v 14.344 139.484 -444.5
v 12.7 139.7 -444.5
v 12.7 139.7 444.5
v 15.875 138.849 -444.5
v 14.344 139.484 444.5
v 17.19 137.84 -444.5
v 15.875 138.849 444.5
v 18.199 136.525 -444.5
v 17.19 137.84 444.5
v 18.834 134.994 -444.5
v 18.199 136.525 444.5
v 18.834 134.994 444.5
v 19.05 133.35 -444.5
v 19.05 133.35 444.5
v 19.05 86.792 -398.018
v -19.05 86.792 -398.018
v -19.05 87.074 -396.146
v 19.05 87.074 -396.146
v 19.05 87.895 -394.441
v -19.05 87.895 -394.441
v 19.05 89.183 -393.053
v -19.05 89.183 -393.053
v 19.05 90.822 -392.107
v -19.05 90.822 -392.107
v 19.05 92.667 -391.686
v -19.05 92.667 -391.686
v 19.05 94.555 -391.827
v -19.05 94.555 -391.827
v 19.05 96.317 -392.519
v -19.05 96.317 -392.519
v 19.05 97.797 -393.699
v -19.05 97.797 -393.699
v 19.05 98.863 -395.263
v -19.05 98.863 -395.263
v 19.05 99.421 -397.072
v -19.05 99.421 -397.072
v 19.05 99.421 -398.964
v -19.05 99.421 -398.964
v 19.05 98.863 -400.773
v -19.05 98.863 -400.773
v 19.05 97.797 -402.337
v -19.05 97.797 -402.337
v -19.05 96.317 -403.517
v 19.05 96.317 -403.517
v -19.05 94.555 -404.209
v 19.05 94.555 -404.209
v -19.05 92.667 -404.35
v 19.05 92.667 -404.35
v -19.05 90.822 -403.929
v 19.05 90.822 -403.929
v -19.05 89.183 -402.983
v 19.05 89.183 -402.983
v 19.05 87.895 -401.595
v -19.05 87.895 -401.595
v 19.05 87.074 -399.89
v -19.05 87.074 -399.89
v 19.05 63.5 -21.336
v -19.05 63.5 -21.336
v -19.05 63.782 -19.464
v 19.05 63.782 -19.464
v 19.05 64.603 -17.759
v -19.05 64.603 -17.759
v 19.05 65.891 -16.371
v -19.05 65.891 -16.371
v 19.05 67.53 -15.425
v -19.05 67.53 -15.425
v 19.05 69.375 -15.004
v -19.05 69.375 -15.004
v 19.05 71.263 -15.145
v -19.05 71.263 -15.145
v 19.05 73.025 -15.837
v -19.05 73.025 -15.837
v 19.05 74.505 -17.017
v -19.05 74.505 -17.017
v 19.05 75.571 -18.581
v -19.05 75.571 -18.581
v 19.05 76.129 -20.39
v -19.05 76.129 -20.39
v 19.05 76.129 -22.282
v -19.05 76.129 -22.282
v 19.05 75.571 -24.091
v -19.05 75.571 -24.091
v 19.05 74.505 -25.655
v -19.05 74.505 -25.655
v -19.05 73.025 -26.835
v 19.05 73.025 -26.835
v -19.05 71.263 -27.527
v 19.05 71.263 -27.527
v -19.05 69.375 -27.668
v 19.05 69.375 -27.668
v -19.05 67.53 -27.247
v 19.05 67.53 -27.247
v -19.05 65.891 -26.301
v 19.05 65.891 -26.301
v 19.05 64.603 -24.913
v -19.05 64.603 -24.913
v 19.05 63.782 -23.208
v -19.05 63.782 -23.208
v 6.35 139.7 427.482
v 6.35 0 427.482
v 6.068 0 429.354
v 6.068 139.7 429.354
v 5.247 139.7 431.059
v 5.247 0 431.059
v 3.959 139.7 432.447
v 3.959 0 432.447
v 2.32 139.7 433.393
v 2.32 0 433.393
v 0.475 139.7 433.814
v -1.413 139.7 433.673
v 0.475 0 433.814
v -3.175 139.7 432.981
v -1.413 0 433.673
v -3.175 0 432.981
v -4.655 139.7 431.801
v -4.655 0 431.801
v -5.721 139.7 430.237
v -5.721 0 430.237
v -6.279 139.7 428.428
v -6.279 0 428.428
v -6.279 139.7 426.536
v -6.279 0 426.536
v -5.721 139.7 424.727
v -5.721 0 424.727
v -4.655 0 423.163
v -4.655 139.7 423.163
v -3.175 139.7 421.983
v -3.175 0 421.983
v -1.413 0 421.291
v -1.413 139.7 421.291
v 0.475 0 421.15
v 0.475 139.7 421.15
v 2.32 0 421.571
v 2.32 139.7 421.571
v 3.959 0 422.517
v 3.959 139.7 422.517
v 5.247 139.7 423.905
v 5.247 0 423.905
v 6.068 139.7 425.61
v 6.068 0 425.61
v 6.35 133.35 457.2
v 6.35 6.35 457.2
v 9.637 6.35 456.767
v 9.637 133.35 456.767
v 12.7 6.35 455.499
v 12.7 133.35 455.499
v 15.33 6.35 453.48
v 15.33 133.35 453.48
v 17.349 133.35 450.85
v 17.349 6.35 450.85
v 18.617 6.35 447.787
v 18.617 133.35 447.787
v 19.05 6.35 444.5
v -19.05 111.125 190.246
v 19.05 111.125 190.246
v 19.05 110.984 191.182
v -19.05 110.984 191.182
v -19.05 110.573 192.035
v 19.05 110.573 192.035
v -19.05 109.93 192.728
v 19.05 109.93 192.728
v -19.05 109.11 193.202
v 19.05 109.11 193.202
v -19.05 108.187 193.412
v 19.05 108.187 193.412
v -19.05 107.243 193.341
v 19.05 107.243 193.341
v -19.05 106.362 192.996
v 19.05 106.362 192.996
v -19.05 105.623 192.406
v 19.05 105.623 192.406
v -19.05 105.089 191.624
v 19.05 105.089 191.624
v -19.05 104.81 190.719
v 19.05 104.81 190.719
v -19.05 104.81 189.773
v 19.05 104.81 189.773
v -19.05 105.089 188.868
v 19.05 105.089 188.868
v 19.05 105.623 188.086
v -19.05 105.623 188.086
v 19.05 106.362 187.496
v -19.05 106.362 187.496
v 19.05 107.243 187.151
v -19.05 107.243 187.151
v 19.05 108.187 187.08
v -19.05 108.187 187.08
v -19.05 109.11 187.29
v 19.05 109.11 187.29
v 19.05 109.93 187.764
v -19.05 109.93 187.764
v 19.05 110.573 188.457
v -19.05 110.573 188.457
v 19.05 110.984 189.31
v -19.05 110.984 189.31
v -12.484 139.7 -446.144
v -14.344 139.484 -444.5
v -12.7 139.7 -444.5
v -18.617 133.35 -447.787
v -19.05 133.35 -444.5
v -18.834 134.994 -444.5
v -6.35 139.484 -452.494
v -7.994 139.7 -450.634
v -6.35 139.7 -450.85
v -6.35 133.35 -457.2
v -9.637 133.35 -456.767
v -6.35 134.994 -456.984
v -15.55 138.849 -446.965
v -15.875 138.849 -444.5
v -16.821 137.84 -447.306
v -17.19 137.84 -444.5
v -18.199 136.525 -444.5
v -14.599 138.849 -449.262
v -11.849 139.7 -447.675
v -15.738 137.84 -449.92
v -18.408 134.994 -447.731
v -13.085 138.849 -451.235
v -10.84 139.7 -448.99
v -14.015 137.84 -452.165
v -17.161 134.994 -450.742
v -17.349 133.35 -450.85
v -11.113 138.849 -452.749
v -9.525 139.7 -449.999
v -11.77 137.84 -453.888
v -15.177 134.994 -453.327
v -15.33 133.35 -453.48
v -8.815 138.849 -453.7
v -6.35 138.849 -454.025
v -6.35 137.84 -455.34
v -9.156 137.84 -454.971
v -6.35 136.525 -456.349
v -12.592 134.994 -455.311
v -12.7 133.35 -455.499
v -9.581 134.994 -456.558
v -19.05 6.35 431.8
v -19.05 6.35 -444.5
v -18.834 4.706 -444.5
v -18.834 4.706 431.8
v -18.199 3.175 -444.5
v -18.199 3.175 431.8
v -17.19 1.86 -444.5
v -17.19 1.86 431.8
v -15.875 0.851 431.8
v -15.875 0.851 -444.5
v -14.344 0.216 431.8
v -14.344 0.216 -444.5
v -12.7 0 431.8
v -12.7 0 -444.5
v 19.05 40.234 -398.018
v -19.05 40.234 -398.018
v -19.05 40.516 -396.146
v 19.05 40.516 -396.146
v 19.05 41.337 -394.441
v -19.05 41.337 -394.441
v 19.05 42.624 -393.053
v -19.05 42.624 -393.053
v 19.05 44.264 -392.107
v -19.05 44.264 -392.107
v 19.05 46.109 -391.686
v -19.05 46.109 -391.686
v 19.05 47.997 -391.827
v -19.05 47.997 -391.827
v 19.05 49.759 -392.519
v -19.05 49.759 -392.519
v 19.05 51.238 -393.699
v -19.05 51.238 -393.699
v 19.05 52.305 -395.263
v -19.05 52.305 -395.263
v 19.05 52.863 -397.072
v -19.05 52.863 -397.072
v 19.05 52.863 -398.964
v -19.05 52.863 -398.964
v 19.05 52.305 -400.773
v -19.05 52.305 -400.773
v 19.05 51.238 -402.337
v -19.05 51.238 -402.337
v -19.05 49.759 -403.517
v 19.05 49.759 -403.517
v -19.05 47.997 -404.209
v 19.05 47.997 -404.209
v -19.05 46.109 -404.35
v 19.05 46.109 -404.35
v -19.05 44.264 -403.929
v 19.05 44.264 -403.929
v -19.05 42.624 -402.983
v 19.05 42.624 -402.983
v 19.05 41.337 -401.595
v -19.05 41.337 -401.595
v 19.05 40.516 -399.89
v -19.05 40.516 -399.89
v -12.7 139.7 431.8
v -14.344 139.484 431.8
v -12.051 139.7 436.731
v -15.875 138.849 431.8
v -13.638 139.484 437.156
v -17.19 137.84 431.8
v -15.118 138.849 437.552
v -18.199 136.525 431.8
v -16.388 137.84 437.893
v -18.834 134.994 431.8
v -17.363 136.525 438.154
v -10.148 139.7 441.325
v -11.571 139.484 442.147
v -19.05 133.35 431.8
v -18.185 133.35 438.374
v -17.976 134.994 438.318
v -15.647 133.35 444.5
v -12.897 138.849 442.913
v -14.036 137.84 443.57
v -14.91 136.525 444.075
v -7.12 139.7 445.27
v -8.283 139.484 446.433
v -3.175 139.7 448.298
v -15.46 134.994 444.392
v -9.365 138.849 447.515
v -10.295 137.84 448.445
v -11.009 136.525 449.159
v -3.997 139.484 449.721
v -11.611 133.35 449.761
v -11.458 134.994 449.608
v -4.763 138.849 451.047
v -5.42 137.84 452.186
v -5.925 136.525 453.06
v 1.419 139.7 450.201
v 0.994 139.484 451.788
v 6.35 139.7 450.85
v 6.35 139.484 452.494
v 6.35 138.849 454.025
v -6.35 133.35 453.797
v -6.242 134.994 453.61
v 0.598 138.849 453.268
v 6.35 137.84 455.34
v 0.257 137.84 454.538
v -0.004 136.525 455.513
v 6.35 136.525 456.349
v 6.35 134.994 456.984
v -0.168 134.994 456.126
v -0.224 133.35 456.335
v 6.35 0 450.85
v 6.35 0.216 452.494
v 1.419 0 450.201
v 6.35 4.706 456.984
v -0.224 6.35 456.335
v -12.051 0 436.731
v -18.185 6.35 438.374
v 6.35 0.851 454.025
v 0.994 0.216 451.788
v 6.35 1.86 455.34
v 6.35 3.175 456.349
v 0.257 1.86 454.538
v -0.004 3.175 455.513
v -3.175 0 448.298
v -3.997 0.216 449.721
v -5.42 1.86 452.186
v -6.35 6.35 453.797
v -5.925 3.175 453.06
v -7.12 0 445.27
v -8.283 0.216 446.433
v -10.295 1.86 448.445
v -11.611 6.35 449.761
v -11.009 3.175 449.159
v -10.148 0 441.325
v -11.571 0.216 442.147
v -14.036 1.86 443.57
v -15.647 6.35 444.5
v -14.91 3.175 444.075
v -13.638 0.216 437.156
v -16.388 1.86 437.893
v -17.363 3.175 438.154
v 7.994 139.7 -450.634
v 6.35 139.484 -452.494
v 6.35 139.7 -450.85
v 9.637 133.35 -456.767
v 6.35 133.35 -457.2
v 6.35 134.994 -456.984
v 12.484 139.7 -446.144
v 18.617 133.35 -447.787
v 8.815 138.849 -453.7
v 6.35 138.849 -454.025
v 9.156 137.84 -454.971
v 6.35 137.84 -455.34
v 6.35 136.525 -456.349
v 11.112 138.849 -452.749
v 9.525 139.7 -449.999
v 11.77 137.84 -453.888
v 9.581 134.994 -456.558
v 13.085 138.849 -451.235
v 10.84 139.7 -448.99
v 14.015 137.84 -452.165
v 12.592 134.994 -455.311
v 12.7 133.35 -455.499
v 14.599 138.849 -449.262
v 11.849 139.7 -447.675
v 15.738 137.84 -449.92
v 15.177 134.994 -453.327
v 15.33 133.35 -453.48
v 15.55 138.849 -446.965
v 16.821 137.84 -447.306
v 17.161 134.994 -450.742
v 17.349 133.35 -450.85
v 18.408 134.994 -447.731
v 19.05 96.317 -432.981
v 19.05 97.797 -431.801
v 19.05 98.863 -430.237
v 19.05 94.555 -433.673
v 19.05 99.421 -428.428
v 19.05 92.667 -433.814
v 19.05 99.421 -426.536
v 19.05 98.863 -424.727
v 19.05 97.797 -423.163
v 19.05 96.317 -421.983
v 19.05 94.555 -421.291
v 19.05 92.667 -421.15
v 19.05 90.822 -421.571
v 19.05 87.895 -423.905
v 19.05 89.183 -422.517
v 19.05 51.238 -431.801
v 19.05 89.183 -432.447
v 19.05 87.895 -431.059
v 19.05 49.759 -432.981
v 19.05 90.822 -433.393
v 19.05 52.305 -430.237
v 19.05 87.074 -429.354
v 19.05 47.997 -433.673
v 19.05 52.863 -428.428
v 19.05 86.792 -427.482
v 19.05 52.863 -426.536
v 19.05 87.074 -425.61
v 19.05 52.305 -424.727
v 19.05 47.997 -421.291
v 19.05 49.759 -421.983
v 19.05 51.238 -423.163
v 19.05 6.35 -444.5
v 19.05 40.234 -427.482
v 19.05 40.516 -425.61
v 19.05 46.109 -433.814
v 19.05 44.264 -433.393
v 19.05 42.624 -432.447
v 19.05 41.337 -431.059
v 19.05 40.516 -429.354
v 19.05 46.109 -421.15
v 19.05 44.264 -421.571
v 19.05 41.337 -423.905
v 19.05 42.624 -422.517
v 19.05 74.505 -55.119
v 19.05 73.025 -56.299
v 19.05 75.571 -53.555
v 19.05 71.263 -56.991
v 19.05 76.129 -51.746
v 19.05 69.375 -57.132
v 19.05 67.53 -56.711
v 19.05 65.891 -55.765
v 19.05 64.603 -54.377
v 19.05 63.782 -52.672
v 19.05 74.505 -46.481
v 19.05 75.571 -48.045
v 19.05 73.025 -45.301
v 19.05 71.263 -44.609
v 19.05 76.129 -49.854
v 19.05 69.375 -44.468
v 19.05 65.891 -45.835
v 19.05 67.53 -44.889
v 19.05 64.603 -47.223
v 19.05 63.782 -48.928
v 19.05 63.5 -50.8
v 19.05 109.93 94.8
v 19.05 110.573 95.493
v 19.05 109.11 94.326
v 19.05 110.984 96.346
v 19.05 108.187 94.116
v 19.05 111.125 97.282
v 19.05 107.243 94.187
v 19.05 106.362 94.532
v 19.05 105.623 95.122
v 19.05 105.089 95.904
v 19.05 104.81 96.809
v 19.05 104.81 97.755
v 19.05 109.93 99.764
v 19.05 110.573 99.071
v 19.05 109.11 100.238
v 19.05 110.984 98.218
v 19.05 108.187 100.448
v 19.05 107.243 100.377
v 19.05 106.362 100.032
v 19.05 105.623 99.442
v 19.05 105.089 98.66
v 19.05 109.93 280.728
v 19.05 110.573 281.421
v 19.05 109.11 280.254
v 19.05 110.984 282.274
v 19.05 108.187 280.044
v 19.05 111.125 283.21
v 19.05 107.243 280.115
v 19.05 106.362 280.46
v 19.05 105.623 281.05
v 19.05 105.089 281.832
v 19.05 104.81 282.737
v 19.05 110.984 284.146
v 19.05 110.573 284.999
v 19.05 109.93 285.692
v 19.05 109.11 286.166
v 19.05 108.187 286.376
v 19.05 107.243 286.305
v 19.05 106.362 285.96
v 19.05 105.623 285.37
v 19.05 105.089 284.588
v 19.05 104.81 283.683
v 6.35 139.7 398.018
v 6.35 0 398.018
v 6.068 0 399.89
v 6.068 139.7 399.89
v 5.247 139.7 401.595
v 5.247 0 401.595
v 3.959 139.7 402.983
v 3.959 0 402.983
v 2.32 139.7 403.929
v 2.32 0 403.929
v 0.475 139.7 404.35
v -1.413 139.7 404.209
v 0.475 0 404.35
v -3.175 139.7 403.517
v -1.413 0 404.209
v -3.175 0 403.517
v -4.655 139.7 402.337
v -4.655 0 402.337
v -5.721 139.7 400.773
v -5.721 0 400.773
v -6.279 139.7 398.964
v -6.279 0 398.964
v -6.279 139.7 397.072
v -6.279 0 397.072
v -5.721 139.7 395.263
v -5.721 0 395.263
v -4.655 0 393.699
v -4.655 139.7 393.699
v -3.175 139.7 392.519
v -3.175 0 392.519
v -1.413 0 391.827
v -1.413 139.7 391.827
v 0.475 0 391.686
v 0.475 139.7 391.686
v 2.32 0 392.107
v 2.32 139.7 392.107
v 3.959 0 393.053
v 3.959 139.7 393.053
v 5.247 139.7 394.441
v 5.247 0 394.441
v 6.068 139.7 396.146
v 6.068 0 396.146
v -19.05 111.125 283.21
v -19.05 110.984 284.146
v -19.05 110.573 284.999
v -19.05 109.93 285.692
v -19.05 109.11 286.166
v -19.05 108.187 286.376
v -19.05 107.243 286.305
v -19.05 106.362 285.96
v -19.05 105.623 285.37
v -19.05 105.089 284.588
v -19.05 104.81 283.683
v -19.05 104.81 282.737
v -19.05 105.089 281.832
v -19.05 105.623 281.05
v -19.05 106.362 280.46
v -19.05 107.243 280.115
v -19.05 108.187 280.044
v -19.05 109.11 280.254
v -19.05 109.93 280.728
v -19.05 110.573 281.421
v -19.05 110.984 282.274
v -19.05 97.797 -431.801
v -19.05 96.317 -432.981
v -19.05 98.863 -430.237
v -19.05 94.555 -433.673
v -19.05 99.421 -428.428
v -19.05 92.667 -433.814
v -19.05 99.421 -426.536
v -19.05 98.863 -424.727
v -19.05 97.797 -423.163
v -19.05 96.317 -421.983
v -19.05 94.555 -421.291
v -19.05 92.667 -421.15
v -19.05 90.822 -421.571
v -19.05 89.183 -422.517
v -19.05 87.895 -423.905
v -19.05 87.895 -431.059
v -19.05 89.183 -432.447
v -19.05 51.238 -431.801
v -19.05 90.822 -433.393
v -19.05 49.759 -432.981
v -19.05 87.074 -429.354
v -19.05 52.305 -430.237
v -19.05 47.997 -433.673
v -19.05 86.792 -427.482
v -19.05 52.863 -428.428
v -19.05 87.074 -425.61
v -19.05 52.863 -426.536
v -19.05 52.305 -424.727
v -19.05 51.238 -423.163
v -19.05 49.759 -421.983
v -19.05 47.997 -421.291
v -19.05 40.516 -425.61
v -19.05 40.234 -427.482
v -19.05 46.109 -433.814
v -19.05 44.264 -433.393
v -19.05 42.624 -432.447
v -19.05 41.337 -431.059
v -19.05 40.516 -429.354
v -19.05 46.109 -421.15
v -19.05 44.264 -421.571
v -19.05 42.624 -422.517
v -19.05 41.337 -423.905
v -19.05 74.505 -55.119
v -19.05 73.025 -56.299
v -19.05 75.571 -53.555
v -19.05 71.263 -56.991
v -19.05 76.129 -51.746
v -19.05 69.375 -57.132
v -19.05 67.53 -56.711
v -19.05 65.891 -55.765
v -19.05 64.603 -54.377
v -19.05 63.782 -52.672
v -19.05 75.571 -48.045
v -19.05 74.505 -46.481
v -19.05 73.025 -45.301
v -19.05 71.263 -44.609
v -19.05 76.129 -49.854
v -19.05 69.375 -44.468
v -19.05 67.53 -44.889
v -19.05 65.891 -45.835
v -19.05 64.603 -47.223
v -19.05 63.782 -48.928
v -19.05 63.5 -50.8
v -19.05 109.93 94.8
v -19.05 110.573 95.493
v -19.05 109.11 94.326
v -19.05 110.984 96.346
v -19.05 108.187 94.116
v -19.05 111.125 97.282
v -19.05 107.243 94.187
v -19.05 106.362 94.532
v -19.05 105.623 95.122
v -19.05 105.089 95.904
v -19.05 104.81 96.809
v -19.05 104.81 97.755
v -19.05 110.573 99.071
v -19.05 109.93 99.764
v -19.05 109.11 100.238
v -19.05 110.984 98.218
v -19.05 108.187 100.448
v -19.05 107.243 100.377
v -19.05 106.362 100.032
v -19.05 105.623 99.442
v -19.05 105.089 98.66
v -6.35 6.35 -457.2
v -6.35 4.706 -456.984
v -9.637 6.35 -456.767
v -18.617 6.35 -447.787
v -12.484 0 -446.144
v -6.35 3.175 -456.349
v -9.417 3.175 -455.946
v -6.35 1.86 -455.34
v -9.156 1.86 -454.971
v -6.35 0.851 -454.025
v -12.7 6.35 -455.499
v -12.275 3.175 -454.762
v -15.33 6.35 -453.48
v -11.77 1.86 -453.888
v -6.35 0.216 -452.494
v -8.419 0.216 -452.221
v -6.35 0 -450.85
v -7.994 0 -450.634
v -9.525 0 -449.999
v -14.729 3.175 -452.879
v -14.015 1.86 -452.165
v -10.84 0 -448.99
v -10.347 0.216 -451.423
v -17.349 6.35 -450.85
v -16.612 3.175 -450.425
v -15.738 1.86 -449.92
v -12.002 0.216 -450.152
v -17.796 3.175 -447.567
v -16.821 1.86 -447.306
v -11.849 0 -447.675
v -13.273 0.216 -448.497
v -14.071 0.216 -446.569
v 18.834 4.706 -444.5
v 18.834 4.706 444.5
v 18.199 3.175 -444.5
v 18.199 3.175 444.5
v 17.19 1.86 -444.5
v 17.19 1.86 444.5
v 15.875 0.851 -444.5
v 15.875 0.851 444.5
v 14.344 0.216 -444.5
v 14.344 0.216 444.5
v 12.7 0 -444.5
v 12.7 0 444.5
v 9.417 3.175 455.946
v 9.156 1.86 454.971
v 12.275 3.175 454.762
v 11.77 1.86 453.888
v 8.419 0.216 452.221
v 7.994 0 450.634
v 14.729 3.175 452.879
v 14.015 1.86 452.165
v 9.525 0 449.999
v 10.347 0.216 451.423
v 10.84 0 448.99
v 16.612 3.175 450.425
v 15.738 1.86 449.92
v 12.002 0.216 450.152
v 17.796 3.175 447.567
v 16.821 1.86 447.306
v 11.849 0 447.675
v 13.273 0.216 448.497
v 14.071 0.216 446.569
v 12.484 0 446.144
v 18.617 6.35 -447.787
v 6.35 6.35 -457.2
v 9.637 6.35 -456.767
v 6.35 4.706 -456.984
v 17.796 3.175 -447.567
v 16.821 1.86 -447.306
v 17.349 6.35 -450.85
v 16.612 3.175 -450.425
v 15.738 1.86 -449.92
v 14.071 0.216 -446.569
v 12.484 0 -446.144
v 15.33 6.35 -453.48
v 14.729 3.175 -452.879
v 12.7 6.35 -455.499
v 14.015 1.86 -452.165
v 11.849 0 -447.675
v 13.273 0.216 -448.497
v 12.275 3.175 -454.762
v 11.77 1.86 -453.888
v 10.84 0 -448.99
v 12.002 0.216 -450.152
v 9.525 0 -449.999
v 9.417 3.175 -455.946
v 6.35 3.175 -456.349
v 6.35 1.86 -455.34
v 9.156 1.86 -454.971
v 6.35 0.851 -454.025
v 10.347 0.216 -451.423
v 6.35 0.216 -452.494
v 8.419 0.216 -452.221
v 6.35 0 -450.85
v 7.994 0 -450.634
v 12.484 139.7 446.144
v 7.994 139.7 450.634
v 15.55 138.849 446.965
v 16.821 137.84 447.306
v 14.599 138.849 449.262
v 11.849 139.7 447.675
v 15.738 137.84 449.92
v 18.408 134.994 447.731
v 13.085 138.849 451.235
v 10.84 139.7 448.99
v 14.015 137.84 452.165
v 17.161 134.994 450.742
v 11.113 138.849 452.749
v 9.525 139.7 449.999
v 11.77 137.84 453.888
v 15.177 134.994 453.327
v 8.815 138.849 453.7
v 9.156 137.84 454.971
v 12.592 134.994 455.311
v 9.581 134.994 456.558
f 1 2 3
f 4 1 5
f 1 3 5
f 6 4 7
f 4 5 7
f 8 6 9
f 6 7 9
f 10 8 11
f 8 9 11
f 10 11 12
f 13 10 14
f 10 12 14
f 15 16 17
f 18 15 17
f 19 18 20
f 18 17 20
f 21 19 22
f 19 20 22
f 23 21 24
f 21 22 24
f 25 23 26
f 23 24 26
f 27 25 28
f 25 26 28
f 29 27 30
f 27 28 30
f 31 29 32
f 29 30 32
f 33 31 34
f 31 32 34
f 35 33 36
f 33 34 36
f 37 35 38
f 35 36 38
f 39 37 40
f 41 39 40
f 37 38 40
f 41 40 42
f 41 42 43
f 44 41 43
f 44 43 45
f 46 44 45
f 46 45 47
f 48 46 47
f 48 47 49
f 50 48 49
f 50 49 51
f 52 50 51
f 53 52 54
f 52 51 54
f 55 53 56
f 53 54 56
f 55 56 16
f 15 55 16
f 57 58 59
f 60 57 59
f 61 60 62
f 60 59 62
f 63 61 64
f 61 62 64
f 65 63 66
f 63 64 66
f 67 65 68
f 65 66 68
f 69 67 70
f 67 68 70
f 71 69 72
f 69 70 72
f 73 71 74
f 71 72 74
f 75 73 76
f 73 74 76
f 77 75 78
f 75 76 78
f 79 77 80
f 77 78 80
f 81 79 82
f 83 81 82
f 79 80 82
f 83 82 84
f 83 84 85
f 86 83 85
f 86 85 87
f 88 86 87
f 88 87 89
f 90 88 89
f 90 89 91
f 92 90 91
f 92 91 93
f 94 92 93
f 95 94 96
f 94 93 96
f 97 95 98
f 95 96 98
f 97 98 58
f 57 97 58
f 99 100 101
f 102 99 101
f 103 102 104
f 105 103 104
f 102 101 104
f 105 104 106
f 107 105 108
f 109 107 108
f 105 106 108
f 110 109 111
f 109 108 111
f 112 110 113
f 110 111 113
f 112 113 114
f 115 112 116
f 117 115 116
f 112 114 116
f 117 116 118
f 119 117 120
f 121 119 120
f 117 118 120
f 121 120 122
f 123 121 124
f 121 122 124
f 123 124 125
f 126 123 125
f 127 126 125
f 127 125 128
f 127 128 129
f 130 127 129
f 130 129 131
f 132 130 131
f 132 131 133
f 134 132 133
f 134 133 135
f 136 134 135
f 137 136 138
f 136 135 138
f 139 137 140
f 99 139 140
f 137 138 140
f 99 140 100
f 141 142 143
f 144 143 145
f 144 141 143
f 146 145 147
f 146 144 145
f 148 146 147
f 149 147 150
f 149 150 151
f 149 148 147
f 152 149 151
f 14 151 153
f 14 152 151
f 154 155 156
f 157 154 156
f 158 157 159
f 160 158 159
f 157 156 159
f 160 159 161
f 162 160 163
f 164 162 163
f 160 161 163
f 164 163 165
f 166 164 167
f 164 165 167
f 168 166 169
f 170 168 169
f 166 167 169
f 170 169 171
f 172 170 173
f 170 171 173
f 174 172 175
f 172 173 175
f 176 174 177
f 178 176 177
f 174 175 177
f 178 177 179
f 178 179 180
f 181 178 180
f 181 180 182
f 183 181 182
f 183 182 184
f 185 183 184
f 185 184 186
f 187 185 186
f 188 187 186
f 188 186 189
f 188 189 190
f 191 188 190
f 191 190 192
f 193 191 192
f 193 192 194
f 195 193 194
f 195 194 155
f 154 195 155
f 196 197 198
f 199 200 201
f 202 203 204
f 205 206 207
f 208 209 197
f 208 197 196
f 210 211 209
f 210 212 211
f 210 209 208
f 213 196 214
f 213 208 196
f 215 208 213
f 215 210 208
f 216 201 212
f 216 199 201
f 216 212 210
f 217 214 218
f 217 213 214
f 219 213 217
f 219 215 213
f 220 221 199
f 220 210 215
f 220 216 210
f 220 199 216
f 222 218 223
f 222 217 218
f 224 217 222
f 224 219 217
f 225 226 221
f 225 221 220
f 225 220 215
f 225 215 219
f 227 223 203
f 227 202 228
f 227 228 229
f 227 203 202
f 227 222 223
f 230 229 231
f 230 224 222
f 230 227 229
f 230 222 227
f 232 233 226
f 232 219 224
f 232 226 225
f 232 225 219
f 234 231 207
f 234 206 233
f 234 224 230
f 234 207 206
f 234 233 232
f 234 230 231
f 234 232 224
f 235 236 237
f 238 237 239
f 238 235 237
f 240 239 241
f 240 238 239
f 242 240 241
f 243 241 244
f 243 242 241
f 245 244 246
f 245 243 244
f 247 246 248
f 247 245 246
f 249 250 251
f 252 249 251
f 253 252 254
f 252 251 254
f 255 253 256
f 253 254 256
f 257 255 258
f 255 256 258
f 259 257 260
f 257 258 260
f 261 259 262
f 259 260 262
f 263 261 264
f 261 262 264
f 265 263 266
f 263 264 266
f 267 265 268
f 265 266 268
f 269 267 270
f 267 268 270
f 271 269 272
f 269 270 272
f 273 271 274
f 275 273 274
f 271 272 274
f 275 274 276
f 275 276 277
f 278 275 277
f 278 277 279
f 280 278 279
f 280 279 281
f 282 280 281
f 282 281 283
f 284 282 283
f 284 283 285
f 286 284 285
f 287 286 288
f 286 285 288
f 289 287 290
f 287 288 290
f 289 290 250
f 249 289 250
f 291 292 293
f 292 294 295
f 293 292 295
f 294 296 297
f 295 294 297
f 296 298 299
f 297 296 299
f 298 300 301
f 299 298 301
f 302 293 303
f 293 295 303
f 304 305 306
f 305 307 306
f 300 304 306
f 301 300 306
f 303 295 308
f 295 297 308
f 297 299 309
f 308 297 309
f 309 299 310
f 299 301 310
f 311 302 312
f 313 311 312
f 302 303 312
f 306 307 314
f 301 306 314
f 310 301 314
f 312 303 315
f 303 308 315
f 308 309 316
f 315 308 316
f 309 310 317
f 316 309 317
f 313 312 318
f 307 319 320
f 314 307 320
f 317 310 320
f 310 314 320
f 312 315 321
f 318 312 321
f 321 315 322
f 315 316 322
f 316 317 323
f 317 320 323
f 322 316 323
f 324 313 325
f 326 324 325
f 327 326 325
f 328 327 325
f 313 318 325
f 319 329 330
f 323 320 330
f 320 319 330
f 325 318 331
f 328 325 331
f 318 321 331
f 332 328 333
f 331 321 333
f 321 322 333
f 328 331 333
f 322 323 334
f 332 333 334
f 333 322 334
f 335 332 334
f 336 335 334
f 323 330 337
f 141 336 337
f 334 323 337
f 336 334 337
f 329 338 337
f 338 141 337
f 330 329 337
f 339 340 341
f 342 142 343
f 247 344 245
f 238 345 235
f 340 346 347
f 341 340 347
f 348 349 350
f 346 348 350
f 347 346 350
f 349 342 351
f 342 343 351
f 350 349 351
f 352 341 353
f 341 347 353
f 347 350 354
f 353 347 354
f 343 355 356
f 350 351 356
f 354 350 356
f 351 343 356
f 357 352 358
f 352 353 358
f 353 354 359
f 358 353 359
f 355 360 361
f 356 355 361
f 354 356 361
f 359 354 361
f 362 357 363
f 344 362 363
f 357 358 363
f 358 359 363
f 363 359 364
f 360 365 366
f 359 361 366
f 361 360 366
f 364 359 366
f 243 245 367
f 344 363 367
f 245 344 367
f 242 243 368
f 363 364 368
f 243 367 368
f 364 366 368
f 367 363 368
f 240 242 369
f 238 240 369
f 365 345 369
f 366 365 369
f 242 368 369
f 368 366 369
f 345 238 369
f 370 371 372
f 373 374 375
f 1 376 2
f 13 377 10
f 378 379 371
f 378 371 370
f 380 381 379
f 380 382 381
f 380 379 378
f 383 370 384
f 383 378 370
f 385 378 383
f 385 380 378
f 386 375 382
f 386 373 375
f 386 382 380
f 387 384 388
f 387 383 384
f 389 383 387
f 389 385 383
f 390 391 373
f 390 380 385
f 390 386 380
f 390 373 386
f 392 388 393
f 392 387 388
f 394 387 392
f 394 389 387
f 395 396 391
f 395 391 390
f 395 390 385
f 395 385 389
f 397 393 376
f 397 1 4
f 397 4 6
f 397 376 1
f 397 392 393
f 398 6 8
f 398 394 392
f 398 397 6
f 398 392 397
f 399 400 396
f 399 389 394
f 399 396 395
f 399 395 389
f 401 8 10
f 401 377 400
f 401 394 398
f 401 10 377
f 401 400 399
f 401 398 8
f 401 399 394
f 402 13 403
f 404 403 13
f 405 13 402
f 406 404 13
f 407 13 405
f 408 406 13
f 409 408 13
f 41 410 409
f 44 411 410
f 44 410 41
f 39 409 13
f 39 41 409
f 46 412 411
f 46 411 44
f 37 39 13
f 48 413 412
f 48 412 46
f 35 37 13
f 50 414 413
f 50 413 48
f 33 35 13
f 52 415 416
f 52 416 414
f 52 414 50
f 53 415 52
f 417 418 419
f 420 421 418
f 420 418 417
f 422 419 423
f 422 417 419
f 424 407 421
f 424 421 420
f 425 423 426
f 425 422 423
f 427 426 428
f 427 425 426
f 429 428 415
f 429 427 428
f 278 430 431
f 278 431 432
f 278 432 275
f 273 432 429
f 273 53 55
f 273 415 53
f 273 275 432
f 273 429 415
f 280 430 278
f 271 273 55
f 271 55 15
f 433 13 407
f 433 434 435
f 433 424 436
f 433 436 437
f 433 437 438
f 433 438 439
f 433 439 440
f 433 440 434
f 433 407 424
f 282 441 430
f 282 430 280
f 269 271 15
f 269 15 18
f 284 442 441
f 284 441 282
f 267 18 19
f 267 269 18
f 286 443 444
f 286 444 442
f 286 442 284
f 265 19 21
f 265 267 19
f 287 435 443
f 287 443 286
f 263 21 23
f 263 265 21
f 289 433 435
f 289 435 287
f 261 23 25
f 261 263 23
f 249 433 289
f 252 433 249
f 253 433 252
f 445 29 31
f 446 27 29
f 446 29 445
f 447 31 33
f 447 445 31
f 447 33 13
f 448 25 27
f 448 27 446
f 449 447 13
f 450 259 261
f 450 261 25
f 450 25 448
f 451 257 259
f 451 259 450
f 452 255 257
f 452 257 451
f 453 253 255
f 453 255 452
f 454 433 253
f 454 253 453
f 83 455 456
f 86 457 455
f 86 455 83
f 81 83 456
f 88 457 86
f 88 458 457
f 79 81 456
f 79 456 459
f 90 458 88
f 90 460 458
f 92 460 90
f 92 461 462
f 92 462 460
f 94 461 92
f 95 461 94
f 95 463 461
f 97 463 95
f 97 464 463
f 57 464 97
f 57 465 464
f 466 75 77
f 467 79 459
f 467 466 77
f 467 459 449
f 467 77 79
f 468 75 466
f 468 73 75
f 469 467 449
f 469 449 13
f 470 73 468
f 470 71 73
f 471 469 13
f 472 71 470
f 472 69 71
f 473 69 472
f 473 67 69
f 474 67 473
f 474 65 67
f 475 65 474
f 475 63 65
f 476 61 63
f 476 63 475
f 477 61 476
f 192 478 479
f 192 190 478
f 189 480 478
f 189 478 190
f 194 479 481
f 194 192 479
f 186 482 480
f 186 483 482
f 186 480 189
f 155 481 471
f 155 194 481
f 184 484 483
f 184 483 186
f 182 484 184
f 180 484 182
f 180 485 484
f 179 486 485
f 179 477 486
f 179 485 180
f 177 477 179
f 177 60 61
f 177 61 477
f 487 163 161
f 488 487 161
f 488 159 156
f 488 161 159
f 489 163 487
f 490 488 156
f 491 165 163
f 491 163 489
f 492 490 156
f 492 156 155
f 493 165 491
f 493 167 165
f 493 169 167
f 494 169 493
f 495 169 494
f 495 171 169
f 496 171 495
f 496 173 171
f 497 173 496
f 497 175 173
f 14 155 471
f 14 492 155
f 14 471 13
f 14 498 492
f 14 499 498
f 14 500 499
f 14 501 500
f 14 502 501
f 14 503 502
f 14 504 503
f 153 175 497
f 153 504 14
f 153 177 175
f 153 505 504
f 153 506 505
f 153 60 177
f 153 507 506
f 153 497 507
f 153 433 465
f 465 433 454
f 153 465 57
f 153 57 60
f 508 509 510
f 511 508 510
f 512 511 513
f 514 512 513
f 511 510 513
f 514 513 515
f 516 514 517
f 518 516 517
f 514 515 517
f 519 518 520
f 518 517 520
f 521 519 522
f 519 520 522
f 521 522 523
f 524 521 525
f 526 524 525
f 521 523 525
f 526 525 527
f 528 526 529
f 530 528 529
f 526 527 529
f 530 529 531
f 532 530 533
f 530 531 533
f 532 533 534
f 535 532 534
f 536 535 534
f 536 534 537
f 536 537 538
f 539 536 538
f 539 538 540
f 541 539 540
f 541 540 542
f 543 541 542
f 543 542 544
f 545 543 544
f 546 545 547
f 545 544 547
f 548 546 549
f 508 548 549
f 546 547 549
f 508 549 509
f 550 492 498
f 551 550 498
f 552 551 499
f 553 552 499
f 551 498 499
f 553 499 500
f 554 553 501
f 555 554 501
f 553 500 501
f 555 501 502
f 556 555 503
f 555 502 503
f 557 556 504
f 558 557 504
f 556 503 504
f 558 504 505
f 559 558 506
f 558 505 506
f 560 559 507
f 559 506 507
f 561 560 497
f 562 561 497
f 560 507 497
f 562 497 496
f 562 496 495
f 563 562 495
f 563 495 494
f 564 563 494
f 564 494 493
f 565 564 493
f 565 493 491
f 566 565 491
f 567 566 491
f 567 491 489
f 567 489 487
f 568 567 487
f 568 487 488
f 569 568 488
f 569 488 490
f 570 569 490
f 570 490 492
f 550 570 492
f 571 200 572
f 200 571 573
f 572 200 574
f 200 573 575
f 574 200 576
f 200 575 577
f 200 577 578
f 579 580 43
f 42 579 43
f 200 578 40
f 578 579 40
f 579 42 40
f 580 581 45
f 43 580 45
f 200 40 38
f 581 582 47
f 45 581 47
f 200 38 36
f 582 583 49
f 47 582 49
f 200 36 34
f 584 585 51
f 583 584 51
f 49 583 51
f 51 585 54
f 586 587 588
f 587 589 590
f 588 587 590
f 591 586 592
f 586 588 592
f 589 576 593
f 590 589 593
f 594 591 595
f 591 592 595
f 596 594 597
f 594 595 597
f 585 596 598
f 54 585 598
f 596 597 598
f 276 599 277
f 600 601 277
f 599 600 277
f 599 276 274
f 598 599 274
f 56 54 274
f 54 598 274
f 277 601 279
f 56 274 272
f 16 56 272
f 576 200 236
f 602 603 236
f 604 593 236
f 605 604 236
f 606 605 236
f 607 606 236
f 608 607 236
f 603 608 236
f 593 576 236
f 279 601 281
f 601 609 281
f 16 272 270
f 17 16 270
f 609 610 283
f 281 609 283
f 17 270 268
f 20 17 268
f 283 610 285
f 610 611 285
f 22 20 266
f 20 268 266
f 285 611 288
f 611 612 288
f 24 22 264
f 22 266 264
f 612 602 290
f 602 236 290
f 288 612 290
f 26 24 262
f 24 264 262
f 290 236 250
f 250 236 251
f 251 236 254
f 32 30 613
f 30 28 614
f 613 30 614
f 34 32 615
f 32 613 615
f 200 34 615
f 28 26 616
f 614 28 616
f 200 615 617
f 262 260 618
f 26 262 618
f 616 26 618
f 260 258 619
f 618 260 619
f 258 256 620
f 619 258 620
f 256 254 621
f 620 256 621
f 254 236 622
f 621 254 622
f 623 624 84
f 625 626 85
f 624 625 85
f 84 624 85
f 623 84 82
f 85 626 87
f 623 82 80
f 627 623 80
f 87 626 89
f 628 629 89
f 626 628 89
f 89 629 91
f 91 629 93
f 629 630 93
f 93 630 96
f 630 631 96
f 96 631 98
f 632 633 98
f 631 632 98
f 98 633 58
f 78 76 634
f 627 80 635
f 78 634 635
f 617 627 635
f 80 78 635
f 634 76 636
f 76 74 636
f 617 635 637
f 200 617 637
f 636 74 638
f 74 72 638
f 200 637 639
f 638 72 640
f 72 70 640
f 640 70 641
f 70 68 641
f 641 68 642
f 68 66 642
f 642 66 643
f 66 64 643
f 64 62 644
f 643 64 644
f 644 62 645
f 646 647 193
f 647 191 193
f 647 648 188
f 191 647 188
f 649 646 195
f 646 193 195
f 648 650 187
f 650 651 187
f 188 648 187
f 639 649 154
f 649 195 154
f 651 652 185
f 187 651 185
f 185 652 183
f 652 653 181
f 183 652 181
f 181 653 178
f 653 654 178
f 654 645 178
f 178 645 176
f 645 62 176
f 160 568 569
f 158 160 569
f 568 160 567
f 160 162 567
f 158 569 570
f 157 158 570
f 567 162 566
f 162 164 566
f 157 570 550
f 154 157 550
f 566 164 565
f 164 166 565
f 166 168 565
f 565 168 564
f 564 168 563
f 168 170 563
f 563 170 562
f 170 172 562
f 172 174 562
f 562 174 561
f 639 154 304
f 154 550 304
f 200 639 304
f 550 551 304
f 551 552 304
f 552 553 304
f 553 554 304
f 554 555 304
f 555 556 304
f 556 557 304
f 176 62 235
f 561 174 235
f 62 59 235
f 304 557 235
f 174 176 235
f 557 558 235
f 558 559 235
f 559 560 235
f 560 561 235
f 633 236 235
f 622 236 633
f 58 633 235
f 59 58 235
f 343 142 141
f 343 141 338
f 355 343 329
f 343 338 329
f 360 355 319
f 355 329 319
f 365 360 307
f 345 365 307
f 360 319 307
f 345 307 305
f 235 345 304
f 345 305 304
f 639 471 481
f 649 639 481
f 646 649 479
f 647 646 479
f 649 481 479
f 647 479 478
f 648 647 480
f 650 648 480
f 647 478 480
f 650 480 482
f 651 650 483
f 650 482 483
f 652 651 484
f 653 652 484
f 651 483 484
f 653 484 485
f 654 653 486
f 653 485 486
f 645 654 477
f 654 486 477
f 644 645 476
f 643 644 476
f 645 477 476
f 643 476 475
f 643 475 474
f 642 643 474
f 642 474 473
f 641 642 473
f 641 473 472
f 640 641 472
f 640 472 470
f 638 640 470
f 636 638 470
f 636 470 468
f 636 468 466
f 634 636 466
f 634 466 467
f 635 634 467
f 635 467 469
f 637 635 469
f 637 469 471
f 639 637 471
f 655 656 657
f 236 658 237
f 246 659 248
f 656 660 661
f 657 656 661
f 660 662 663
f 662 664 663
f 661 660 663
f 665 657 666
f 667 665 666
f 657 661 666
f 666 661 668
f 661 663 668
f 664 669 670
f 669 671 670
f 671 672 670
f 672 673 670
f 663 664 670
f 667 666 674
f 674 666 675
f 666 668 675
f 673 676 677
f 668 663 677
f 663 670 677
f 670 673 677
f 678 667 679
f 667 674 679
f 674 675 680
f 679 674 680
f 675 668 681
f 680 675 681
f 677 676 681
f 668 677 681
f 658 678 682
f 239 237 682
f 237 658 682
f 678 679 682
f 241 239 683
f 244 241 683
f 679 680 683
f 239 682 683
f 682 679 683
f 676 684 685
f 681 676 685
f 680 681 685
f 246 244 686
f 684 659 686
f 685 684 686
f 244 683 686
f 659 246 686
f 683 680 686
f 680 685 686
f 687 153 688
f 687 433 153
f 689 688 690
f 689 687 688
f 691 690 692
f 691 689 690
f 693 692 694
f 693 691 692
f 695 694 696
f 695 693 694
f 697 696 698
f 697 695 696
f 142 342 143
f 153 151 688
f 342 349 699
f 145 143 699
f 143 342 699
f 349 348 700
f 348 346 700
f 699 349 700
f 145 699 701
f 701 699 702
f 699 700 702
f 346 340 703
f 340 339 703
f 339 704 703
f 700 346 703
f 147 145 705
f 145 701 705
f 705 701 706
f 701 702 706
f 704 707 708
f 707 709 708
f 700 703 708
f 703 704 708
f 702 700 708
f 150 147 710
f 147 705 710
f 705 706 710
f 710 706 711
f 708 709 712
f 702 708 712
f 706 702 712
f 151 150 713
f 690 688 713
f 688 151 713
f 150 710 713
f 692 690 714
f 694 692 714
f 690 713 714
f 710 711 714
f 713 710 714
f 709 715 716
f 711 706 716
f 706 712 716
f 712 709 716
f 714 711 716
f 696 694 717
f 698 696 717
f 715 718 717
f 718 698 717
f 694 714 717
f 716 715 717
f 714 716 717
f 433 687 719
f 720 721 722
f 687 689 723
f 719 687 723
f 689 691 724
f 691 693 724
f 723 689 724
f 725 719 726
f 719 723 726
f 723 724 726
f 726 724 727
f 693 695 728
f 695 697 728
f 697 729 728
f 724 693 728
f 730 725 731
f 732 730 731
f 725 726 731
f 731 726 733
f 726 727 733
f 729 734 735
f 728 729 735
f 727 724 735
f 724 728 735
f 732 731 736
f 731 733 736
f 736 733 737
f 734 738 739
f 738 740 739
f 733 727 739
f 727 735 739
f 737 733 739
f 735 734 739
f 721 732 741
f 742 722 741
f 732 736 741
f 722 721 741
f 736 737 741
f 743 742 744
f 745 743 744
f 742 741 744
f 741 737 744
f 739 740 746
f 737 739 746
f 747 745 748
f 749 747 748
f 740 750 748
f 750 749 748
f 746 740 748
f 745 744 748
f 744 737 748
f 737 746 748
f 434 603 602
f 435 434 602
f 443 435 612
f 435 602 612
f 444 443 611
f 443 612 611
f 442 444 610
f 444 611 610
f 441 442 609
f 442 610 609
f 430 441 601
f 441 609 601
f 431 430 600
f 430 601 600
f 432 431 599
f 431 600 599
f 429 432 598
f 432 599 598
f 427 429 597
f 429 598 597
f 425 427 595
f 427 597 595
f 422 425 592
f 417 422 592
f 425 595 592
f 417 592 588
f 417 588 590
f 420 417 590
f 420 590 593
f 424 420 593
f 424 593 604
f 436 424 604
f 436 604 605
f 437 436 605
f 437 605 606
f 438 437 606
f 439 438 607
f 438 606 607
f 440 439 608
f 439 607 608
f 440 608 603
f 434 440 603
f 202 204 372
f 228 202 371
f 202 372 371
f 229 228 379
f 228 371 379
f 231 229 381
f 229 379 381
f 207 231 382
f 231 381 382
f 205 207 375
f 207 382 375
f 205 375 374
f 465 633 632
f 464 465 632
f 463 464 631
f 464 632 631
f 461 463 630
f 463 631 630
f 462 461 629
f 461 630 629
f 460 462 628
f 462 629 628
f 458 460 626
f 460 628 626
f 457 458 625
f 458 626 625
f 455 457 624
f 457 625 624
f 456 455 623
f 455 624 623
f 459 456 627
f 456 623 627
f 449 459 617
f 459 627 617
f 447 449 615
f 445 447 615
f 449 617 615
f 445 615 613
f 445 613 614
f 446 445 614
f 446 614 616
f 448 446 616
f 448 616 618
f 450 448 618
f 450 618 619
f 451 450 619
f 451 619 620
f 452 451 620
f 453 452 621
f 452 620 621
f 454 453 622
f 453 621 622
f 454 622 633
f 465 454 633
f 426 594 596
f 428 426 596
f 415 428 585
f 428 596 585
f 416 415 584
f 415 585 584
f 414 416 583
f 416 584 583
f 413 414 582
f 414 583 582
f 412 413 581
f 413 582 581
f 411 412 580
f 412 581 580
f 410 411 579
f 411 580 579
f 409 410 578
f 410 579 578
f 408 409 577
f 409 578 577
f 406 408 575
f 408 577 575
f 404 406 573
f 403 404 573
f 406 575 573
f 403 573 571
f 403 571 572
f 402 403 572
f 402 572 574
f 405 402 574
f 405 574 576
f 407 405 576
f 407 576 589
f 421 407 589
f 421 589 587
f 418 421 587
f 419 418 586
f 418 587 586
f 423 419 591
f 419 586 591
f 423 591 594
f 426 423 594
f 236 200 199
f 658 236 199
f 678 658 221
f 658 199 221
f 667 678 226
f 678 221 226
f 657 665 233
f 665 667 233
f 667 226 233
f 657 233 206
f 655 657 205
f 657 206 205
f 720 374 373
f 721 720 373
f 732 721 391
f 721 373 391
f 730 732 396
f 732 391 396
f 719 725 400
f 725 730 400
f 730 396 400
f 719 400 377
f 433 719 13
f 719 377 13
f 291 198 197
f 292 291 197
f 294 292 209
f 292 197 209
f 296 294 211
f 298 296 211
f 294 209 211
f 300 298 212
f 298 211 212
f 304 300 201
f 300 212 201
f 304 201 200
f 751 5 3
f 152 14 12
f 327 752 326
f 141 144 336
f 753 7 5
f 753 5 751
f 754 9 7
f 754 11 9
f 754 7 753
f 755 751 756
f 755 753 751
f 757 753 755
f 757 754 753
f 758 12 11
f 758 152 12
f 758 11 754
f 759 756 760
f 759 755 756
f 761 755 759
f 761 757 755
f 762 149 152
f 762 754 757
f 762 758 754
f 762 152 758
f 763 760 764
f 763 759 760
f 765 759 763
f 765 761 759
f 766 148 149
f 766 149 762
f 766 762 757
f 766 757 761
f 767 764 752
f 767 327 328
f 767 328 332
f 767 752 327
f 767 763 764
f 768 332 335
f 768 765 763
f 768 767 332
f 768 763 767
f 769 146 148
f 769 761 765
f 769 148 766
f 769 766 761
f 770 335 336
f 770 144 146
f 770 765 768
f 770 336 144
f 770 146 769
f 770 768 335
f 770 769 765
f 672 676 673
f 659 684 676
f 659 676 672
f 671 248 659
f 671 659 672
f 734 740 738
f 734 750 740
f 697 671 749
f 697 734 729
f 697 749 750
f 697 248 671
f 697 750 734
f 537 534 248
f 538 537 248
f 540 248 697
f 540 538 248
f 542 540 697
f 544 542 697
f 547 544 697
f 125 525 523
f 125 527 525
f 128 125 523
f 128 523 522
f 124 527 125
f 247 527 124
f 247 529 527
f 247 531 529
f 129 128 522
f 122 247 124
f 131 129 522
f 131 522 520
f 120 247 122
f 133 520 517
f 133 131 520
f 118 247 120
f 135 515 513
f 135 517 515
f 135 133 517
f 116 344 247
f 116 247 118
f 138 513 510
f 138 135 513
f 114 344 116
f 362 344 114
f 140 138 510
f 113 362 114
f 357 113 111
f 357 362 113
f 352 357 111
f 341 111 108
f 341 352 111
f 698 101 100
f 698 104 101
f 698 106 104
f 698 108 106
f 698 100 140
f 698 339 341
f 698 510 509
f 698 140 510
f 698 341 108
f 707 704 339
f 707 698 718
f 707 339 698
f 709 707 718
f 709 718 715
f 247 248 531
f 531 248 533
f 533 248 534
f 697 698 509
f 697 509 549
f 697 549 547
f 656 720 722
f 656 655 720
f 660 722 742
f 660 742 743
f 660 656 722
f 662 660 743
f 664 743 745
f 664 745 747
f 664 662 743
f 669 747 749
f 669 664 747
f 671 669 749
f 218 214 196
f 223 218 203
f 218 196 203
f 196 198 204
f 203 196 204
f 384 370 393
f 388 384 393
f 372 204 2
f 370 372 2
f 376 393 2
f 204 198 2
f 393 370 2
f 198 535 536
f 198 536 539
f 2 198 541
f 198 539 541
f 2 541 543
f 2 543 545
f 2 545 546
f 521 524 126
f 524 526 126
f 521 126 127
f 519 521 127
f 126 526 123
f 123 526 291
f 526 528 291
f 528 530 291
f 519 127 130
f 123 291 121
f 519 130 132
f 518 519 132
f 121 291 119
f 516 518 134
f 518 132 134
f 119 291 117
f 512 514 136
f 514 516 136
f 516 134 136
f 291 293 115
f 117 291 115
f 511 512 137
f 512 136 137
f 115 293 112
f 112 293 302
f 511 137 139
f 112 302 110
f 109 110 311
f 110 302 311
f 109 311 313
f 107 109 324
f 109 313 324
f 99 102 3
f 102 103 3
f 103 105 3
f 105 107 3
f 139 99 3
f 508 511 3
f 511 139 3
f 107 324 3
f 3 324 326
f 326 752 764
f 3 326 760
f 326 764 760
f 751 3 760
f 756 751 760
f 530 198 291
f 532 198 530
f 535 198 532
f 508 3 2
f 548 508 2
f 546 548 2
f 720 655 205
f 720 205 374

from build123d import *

# Parameters (mm, degrees)
F0_W        = 38.1
F0_H        = 914.4
F0_R        = 6.35
F1_DEPTH    = 139.7
F2_R        = 6.35
F3_DEPTH    = 38.1
F6_R        = 6.35
F7_DEPTH    = 38.1
F8_D        = 6.35
F4_R        = 12.7
F5_R        = 6.35
F9_T1_DEPTH = 139.7
F9_T4_ANGLE = 90
F9_T6_ANGLE = 90


# Not quite as in the source:
# - a fillet or chamfer that OpenCascade refuses, or shapes differently, is made with other operations: its cross-section is extruded or revolved along the edge and cut away or added


with BuildPart() as f1:
    # F0 (on Front) → F1 (new body)
    with BuildSketch(Plane.XZ):
        Rectangle(F0_W, F0_H)
        with Locations((0, 398.018)):
            Circle(F0_R, mode=Mode.SUBTRACT)
        with Locations((0, 427.482)):
            Circle(F0_R, mode=Mode.SUBTRACT)
    extrude(amount=-F1_DEPTH)

    # F2 (on face) → F3 (cut)
    with BuildSketch(Plane(origin=(-19.05, 0, 0), x_dir=(0, -1, 0), z_dir=(-1, 0, 0))):
        with Locations((-93.1418, -427.482)):
            Circle(F2_R)
        with Locations((-93.1418, -398.018)):
            Circle(F2_R)
        with Locations((-46.5836, -427.482)):
            Circle(F2_R)
        with Locations((-46.5836, -398.018)):
            Circle(F2_R)
    extrude(amount=-F3_DEPTH, mode=Mode.SUBTRACT)

    # F6 (on face) → F7 (cut)
    with BuildSketch(Plane(origin=(-19.05, 0, 0), x_dir=(0, -1, 0), z_dir=(-1, 0, 0))):
        with Locations((-69.85, -21.336)):
            Circle(F6_R)
        with Locations((-69.85, -50.8)):
            Circle(F6_R)
    extrude(amount=-F7_DEPTH, mode=Mode.SUBTRACT)

    # F8 (through all)
    with Locations(Plane(origin=(-19.05, 0, 0), x_dir=(0, -1, 0), z_dir=(-1, 0, 0))):
        with Locations((-107.95, 283.21), (-107.95, 190.246), (-107.95, 97.282)):
            Hole(F8_D / 2)

    # F4
    f4_edges = [f1.edges().sort_by_distance(p)[0] for p in [
        (19.05, 69.85, 457.2),
        (-19.05, 69.85, -457.2),
        (19.05, 69.85, -457.2),
    ]]
    fillet(f4_edges, radius=F4_R)

    # F5
    f5_edges = [f1.edges().sort_by_distance(p)[0] for p in [
        (-19.05, 0, 6.35),
        (19.05, 0, 0),
        (19.05, 139.7, 0),
    ]]
    fillet(f5_edges, radius=F5_R)

    # F9: fillet of radius 25.4 on 1 edges, made by hand

    # F9_s2 → F9_t1 (cut)
    with BuildSketch(Plane.XZ.offset(-139.7)):
        with BuildLine():
            ThreePointArc((6.35, 457.2), (-11.6105122421, 449.7605122421), (-19.05, 431.8))
            Line((-19.05, 431.8), (-19.05, 457.2))
            Line((-19.05, 457.2), (6.35, 457.2))
        make_face()
    extrude(amount=F9_T1_DEPTH, mode=Mode.SUBTRACT)

    # F9_s3 → F9_t4 (revolve, cut)
    with BuildSketch(Plane.YZ.offset(6.35)):
        with BuildLine():
            ThreePointArc((0, 450.85), (1.8598719395, 455.3401280605), (6.35, 457.2))
            Line((6.35, 457.2), (0, 457.2))
            Line((0, 457.2), (0, 450.85))
        make_face()
    revolve(axis=Axis((6.35, 0, 431.8), (0, -1, 0)), revolution_arc=F9_T4_ANGLE, mode=Mode.SUBTRACT)

    # F9_s5 → F9_t6 (revolve, cut)
    with BuildSketch(Plane.XY.offset(431.8)):
        with BuildLine():
            ThreePointArc((-12.7, 139.7), (-17.1901280605, 137.8401280605), (-19.05, 133.35))
            Line((-19.05, 133.35), (-19.05, 139.7))
            Line((-19.05, 139.7), (-12.7, 139.7))
        make_face()
    revolve(axis=Axis((6.35, 139.7, 431.8), (0, 1, 0)), revolution_arc=F9_T6_ANGLE, mode=Mode.SUBTRACT)


solid = f1.part
